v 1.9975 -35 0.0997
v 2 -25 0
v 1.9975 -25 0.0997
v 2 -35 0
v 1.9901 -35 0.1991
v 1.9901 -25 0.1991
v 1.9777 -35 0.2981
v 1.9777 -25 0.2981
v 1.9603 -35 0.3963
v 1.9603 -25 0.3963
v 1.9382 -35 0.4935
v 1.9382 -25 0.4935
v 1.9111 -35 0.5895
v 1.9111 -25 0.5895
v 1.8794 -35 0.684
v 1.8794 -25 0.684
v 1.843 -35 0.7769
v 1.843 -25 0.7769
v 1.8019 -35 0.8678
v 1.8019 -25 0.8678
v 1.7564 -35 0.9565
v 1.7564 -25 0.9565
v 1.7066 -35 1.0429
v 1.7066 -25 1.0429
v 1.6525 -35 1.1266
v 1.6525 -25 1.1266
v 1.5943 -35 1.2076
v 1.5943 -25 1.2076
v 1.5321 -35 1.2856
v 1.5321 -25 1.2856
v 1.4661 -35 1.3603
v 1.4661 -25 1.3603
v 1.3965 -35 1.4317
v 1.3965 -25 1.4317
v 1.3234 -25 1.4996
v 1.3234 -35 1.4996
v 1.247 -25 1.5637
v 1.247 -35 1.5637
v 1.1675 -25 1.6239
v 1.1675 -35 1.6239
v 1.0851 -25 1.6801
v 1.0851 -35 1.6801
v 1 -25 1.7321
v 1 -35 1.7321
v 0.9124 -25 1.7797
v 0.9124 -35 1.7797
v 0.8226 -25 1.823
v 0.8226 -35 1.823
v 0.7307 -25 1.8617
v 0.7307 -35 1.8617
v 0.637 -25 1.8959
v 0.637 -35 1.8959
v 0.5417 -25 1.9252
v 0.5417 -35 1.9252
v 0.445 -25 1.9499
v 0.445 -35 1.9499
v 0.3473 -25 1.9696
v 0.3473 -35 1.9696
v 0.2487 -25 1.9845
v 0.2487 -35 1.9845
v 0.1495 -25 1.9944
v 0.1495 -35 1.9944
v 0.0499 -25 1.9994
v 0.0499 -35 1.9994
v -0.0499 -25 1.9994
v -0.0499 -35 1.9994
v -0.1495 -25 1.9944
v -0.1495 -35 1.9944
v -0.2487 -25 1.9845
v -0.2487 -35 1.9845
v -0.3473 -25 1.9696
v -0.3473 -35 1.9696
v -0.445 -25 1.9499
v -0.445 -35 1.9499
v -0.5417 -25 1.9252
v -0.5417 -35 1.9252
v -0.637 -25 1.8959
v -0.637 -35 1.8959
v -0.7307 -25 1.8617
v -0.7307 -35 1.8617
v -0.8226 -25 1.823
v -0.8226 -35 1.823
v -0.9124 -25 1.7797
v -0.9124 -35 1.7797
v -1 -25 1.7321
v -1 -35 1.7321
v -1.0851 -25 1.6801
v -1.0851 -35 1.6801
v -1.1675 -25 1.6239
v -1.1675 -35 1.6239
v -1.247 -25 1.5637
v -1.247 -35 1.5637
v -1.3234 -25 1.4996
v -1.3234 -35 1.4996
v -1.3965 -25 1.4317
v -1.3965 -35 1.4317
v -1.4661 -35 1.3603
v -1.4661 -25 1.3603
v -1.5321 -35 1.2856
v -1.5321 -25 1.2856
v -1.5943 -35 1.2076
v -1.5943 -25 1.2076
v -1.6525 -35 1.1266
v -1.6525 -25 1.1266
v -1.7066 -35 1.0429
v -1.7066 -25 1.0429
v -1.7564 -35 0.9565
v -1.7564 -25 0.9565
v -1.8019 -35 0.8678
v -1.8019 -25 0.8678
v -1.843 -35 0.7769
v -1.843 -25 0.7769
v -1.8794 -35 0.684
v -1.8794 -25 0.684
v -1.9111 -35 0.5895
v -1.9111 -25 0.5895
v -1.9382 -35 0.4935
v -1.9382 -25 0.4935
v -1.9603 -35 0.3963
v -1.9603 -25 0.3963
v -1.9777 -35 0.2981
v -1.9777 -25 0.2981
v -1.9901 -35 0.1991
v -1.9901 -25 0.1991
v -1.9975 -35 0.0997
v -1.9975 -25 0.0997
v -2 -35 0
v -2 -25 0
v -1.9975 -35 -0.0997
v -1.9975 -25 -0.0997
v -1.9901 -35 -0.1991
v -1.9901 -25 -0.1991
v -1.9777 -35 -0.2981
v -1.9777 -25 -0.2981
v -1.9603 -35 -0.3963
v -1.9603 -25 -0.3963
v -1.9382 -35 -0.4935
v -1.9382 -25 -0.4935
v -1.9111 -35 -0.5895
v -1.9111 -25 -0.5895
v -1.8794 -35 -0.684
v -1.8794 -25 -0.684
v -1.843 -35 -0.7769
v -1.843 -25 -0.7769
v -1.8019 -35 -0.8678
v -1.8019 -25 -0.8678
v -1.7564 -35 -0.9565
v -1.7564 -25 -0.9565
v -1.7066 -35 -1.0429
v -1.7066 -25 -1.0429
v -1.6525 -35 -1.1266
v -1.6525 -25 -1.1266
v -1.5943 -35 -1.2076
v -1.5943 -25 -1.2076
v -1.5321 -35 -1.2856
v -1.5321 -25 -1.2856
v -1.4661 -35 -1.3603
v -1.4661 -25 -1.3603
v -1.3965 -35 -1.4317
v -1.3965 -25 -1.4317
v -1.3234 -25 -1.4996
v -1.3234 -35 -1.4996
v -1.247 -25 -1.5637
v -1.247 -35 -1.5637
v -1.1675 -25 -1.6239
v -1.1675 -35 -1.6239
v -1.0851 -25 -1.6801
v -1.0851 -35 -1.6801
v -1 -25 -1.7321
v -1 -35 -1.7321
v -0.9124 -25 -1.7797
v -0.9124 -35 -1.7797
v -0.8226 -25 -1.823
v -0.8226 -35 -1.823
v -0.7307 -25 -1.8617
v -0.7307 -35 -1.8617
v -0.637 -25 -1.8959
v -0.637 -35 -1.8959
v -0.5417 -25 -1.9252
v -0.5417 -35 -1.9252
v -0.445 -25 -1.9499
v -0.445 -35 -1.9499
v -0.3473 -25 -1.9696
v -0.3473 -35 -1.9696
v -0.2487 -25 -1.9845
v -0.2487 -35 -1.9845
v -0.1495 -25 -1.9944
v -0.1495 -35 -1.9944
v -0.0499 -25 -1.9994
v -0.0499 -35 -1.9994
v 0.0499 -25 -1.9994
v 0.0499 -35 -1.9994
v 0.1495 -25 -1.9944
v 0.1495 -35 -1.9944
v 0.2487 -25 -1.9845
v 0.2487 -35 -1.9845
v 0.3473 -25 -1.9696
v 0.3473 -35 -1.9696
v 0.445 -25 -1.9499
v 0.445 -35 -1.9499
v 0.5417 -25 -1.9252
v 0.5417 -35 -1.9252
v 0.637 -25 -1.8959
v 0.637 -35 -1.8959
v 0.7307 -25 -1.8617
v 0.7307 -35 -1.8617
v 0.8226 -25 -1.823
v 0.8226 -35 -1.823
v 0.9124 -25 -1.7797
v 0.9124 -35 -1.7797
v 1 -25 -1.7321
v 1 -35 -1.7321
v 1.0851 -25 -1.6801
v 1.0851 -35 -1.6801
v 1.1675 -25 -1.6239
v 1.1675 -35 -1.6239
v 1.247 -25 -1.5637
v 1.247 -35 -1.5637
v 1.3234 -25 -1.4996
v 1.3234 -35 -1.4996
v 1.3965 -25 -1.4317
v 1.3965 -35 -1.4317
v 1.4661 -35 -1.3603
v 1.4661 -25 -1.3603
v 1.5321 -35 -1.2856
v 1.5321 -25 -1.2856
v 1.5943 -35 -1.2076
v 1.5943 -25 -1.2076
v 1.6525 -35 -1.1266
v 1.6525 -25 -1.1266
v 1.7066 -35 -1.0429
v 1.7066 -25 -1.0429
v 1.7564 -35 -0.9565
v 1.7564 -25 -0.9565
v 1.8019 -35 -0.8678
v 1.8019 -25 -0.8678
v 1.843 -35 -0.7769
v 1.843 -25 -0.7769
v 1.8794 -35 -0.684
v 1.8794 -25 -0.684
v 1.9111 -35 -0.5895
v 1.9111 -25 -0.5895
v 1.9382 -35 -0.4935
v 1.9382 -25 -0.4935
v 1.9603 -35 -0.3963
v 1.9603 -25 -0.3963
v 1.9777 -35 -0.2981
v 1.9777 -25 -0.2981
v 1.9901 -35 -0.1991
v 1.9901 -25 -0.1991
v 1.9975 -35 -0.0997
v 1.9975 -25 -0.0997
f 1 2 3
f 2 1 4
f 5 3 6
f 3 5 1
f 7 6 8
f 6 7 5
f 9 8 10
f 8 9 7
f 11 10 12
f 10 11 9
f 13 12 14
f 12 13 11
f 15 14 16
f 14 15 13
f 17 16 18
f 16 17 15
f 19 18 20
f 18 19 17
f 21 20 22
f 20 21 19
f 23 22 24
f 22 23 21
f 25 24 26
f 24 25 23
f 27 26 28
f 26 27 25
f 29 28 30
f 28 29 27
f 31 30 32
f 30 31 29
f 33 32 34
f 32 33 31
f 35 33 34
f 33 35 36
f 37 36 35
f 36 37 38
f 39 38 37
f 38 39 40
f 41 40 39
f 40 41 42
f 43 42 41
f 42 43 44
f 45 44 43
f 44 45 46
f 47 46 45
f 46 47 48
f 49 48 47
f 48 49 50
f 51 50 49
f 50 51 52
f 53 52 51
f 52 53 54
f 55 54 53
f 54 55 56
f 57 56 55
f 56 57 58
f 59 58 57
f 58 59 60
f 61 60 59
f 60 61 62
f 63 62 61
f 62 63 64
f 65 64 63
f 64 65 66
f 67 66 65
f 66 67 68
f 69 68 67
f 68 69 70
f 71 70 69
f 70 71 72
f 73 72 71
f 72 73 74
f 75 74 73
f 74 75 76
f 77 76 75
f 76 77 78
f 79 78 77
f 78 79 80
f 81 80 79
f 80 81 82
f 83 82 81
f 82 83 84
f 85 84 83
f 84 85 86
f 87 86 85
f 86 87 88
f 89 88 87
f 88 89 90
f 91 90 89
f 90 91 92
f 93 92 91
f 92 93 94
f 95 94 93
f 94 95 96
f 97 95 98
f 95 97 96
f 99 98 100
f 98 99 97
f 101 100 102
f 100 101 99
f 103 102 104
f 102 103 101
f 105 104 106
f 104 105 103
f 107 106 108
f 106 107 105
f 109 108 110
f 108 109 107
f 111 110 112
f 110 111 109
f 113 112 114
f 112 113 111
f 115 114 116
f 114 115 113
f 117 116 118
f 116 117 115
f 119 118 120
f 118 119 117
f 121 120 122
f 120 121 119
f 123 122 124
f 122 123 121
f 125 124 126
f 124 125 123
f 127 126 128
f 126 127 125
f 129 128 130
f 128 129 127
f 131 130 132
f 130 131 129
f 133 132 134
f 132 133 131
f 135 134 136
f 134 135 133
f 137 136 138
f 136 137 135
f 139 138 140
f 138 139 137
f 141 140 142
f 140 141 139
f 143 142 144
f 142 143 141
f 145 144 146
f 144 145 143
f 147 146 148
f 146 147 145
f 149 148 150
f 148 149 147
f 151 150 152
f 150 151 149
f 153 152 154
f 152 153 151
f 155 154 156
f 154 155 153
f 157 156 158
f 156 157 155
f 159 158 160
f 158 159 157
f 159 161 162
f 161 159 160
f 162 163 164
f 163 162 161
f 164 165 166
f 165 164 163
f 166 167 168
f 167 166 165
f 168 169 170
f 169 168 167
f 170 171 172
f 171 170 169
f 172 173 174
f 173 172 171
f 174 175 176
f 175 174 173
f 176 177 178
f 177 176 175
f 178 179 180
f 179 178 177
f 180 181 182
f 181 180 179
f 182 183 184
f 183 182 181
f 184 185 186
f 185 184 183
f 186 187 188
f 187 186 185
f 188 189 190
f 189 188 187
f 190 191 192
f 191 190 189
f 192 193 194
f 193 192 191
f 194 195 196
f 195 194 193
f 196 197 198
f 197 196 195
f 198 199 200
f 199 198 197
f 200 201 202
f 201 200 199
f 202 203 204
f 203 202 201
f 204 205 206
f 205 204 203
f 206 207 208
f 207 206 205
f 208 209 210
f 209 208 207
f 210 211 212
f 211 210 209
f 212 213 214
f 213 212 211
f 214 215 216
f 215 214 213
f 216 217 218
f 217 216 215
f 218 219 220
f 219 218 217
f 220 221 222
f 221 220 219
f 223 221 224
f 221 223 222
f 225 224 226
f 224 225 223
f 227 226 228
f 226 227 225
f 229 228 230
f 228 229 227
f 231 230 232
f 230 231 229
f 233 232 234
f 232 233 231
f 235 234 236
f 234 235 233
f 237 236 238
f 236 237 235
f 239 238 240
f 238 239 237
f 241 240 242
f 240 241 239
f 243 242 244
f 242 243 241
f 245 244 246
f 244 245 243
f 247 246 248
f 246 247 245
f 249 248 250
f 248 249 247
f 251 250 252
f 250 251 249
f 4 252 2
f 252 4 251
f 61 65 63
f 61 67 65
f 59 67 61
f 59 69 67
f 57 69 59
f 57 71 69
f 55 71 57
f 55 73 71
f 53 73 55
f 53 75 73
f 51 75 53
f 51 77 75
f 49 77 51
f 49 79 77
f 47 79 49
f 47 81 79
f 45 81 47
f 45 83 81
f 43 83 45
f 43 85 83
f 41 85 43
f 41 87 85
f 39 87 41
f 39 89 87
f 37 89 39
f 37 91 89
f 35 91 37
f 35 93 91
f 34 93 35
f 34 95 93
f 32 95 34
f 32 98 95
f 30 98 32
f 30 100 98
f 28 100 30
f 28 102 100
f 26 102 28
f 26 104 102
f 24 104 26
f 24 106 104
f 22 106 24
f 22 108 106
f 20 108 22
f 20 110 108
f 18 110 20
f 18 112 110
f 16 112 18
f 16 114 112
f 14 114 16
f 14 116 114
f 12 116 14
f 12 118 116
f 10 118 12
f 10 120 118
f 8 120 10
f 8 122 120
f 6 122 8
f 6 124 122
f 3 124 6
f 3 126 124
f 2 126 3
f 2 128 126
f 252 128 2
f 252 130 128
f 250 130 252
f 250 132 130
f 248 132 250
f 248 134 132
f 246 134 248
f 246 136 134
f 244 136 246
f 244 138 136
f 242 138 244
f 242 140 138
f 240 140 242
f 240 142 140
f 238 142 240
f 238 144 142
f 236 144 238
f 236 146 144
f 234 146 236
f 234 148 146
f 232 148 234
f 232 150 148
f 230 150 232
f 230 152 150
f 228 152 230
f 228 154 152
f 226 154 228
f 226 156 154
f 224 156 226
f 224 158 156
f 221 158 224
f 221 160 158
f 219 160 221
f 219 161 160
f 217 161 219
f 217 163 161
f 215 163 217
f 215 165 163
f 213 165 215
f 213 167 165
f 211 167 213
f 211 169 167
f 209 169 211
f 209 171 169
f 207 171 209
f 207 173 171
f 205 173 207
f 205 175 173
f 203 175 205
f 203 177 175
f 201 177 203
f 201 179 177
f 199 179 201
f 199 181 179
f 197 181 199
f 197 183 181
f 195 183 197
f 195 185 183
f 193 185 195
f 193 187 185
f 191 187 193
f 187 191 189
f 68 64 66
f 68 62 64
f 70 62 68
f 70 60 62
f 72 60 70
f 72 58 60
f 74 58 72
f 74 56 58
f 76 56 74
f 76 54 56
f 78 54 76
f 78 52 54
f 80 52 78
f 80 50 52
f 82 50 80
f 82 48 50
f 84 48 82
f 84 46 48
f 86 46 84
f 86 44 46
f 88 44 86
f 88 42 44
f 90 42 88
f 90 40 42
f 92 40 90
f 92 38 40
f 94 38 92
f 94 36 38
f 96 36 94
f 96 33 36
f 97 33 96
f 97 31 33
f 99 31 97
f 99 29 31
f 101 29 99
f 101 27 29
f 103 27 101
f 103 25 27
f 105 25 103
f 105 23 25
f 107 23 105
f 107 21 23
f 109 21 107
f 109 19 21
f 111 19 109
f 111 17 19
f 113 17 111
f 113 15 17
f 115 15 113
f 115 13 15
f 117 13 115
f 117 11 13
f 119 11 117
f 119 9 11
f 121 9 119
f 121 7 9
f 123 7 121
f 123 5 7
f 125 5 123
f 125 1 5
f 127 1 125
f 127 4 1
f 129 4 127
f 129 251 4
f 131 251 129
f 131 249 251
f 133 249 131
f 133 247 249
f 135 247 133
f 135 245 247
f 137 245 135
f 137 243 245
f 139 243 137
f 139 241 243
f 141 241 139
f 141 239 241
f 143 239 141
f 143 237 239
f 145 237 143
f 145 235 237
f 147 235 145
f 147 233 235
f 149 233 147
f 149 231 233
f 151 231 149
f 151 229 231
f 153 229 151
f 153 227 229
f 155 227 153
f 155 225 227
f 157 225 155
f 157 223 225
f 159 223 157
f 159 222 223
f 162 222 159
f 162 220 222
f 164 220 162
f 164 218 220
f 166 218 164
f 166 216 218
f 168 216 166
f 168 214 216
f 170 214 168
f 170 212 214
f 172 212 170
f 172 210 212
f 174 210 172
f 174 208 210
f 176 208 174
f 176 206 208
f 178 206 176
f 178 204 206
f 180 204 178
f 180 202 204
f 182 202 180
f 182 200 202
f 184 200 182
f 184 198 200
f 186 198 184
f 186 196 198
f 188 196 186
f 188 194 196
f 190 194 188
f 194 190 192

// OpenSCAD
// Generated by SolidPython 1.1.1 on 2022-01-28 14:32:40
$fa = 2;
$fs = 0.1;
$fn = 0;


translate(v = [0, -30.0000000000, 0]) {
	rotate(a = [90, 0, 0]) {
		translate(v = [0, 0, -5.0000000000]) {
			cylinder(d = 4, h = 10);
		}
	}
}
/***********************************************
*********      SolidPython code:      **********
************************************************
 
from vent import *

box_width = 60
box_height = 148
box_length = 174
box_shell_thickness = 5

bolt_size = 4

bracket_thickness = box_shell_thickness-3
sensecap_width = 40
top_bracket_offset = 32 + box_shell_thickness
top_bracket_clamp_height = 5
top_bracket_clamp_width = (box_width - sensecap_width) / 2
top_bracket_height = top_bracket_offset + top_bracket_clamp_height
top_bracket_spacing = 132
sensecap_length = 154
top_bracket_side_width = (box_length - sensecap_length) / 2
top_bracket_top_length = (box_length - top_bracket_spacing)/2
bottom_bracket_clamp_length = 10
bottom_bracket_length = top_bracket_side_width + bottom_bracket_clamp_length
bottom_bracket_offset = 118

airial_offset_x = 50
airial_offset_y = 3
airial_diameter = 13
airial_cone_diameter = min(airial_diameter * 3, box_width)
airial_cone_height = airial_cone_diameter/2

mounting_bracket_plate_thickness = 5
mounting_bracket_plate_extra = 10
mounting_bracket_pole_diameter = 50
mounting_bracket_section_thickness = 10
mounting_bracket_length = mounting_bracket_pole_diameter / 2 + 2 * mounting_bracket_section_thickness + mounting_bracket_plate_thickness
mounting_bracket_width = mounting_bracket_pole_diameter + 2 * mounting_bracket_section_thickness
mounting_bracket_height = 3 * mounting_bracket_section_thickness
mounting_bracket_plate_height = mounting_bracket_height + 2*mounting_bracket_plate_extra
mounting_bracket_plate_width = mounting_bracket_width + 2*mounting_bracket_plate_extra
mounting_bracket_support_width = 20

#Create the box
box = cube((box_length,box_width,box_height), center=True)
box_inside =cube((box_length - 2 * box_shell_thickness, box_width, box_height), center=True)
box_inside = translate((0, 0, -box_shell_thickness))(box_inside)
outer_box = box - box_inside

#Insert the vents
vent = vent_grid(box_length, box_height, box_shell_thickness, 10, 3, 2, 20)
vent1 = translate((0,(box_width-box_shell_thickness)/2,0))(vent)
vent2 = translate((0,-(box_width-box_shell_thickness)/2,0))(rotate(a=(0,0,180))(vent))
vents = vent1 + vent2

#Add the top brackets
bracket_side = cube((bracket_thickness, top_bracket_clamp_width, top_bracket_height), center=True)
translate_x = (top_bracket_spacing+bracket_thickness)/2
translate_y = (sensecap_width + top_bracket_clamp_width) / 2
translate_z = (box_height - top_bracket_height)/2
bracket_side1 = translate((translate_x,translate_y,translate_z))(bracket_side)
bracket_side2 = translate((translate_x,-translate_y,translate_z))(bracket_side)
bracket_side3 = cube((top_bracket_side_width, bracket_thickness, top_bracket_height), center=True)
bracket_side3 = translate(((box_length-top_bracket_side_width)/2,0,translate_z))(bracket_side3)
bracket_top = cube((bracket_thickness, box_width, top_bracket_offset), center=True)
bracket_top = translate((translate_x,0,(box_height - top_bracket_offset)/2))(bracket_top)
bracket_top_2 = cube((top_bracket_top_length, bracket_thickness, top_bracket_offset), center=True)
bracket_top_2 = translate(((box_length-top_bracket_top_length)/2,0,(box_height - top_bracket_offset)/2))(bracket_top_2)
bracket_1 = bracket_side1 + bracket_side2 + bracket_side3 + bracket_top + bracket_top_2
bracket_2 = rotate(a=(0,0,180))(bracket_1)

#Create the bottom brackets
bracket_clamp = cube((bottom_bracket_length, top_bracket_clamp_width, bracket_thickness), center=True)
translate_x = (box_length - bottom_bracket_length)/2
translate_y = (box_width - top_bracket_clamp_width)/2
translate_z = (box_height - bracket_thickness)/2 - bottom_bracket_offset
bracket_clamp1 = translate((translate_x,translate_y,translate_z))(bracket_clamp)
bracket_clamp2 = translate((translate_x,-translate_y,translate_z))(bracket_clamp)
bracket_bridge = cube((top_bracket_side_width, box_width, bracket_thickness), center=True)
bracket_bridge = translate(((box_length-top_bracket_side_width)/2,0,translate_z))(bracket_bridge)
bottom_bracket1 = bracket_clamp1 + bracket_clamp2 + bracket_bridge
bottom_bracket2 = rotate(a=(0,0,180))(bottom_bracket1)

#Remove the large airial hole from the box
large_airial_hole = cylinder(h=airial_cone_height,d1=airial_cone_diameter,d2=0)
large_airial_hole = translate((airial_offset_x, airial_offset_y, box_height / 2 - box_shell_thickness))(large_airial_hole)
box_with_vents = outer_box + vents - large_airial_hole

#Create the airial cone
outer_cone = cylinder(h=airial_cone_height, d1=airial_cone_diameter, d2=0)
inner_cone = translate((0,0,-box_shell_thickness))(cylinder(h=airial_cone_height, d1=airial_cone_diameter, d2=0))
small_airial_hole = cylinder(d=airial_diameter, h=airial_cone_height+2*box_shell_thickness)
airial_cone = outer_cone - inner_cone - small_airial_hole
airial_cone = translate((airial_offset_x, airial_offset_y, box_height / 2))(airial_cone)

#Create the mounting bracket
mounting_bracket = cube((mounting_bracket_width, mounting_bracket_length, mounting_bracket_height), center=True)
pipe_hole = translate((0,-mounting_bracket_length/2,-mounting_bracket_height/2))(cylinder(d=mounting_bracket_pole_diameter,h=mounting_bracket_height))
middle_cube = cube((mounting_bracket_width, mounting_bracket_length-mounting_bracket_plate_thickness, mounting_bracket_section_thickness), center=True)
middle_cube = translate((0,-mounting_bracket_plate_thickness/2,0))(middle_cube)
middle_hole = cube((mounting_bracket_pole_diameter, mounting_bracket_pole_diameter/2, mounting_bracket_section_thickness), center=True)
middle_hole = translate((0,-mounting_bracket_pole_diameter/4,0))(middle_hole)
middle_hole += translate((0,0,-mounting_bracket_section_thickness/2))(cylinder(d=mounting_bracket_pole_diameter,h=mounting_bracket_section_thickness))
middle_hole = translate((0,-mounting_bracket_length/2 + mounting_bracket_section_thickness,0))(middle_hole)
mounting_plate = cube((mounting_bracket_plate_width, mounting_bracket_plate_thickness, mounting_bracket_plate_height), center=True)
# Add the mounting plate to the box
box_with_vents += translate((0,-(box_width-mounting_bracket_plate_thickness)/2,0))(mounting_plate)
# Add supports for the mounting plate
supp1 = cube((mounting_bracket_support_width, box_shell_thickness, box_height), center=True)
supp2 = cube((box_length, box_shell_thickness, mounting_bracket_support_width), center=True)
supps = supp1 +supp2
supps = translate((0,-(box_width-box_shell_thickness)/2,0))(supps)
box_with_vents += supps
bracket_hole = down((box_shell_thickness+mounting_bracket_plate_thickness)/2)(cylinder(d=bolt_size,h=box_shell_thickness+mounting_bracket_plate_thickness))
bracket_hole = rotate(a=(90,0,0))(bracket_hole)
bracket_hole = translate((0,-box_width/2,0))(bracket_hole)

mounting_plate = translate((0,(mounting_bracket_length - mounting_bracket_plate_thickness)/2,0))(mounting_plate)
mounting_bracket = mounting_bracket - pipe_hole - (middle_cube-middle_hole) + mounting_plate
mounting_bracket = translate((0,-mounting_bracket_length/2,0))(mounting_bracket)

test =  bracket_hole
#fa = .1 very good quality
#fa = 0.8 draft quality
scad_render_to_file(box_with_vents, file_header='$fa = 2;\n$fs = 0.1;\n$fn = 0;', filepath='renders/sensecap_box.scad')
scad_render_to_file(airial_cone, file_header='$fa = 2;\n$fs = 0.1;\n$fn = 0;', filepath='renders/sensecap_cone.scad')

scad_render_to_file(test, file_header='$fa = 2;\n$fs = 0.1;\n$fn = 0;', filepath='renders/sensecap_test.scad') 
 
************************************************/
